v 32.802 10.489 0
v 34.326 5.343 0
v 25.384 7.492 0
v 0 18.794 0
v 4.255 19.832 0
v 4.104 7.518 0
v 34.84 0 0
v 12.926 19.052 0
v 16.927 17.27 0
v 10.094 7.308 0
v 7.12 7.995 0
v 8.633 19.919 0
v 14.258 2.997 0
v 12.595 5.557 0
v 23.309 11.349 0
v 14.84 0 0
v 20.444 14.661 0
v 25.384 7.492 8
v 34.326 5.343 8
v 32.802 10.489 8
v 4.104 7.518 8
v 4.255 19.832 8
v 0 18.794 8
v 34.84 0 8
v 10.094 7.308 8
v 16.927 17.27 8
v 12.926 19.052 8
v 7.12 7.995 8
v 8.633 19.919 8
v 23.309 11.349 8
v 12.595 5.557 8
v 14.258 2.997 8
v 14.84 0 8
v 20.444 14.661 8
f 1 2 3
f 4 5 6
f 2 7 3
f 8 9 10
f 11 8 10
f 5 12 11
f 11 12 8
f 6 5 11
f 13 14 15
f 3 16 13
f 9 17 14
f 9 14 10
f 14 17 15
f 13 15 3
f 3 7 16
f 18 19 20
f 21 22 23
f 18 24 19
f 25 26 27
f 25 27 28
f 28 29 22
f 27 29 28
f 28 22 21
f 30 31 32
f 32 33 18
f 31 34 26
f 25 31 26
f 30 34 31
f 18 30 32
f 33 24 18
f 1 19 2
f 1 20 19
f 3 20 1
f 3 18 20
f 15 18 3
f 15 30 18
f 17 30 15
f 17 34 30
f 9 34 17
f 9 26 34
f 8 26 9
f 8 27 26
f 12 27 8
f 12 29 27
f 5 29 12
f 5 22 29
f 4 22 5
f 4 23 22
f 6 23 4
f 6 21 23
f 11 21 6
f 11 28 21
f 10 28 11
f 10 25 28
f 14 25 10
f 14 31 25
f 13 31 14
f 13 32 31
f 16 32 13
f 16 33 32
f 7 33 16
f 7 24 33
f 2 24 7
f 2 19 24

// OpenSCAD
$fn = 32;

// ----------------------------------------------------------------------
// Arc stop: segment, 8 mm thick
// ----------------------------------------------------------------------

// --- parameters (mm) ---
profile_height = 8;       // extrusion height
profile_points = 17;      // points of the closed outline

profile = [[34.84, 0], [34.326, 5.343], [32.802, 10.489], [25.384, 7.492], [23.309, 11.349], [20.444, 14.661], [16.927, 17.27], [12.926, 19.052], [8.633, 19.919], [4.255, 19.832], [0, 18.794], [4.104, 7.518], [7.12, 7.995], [10.094, 7.308], [12.595, 5.557], [14.258, 2.997], [14.84, 0]];  // single closed polygon, 17 points, counter clockwise

// --- the one profile operation ---
linear_extrude(height = profile_height) polygon(points = profile);
